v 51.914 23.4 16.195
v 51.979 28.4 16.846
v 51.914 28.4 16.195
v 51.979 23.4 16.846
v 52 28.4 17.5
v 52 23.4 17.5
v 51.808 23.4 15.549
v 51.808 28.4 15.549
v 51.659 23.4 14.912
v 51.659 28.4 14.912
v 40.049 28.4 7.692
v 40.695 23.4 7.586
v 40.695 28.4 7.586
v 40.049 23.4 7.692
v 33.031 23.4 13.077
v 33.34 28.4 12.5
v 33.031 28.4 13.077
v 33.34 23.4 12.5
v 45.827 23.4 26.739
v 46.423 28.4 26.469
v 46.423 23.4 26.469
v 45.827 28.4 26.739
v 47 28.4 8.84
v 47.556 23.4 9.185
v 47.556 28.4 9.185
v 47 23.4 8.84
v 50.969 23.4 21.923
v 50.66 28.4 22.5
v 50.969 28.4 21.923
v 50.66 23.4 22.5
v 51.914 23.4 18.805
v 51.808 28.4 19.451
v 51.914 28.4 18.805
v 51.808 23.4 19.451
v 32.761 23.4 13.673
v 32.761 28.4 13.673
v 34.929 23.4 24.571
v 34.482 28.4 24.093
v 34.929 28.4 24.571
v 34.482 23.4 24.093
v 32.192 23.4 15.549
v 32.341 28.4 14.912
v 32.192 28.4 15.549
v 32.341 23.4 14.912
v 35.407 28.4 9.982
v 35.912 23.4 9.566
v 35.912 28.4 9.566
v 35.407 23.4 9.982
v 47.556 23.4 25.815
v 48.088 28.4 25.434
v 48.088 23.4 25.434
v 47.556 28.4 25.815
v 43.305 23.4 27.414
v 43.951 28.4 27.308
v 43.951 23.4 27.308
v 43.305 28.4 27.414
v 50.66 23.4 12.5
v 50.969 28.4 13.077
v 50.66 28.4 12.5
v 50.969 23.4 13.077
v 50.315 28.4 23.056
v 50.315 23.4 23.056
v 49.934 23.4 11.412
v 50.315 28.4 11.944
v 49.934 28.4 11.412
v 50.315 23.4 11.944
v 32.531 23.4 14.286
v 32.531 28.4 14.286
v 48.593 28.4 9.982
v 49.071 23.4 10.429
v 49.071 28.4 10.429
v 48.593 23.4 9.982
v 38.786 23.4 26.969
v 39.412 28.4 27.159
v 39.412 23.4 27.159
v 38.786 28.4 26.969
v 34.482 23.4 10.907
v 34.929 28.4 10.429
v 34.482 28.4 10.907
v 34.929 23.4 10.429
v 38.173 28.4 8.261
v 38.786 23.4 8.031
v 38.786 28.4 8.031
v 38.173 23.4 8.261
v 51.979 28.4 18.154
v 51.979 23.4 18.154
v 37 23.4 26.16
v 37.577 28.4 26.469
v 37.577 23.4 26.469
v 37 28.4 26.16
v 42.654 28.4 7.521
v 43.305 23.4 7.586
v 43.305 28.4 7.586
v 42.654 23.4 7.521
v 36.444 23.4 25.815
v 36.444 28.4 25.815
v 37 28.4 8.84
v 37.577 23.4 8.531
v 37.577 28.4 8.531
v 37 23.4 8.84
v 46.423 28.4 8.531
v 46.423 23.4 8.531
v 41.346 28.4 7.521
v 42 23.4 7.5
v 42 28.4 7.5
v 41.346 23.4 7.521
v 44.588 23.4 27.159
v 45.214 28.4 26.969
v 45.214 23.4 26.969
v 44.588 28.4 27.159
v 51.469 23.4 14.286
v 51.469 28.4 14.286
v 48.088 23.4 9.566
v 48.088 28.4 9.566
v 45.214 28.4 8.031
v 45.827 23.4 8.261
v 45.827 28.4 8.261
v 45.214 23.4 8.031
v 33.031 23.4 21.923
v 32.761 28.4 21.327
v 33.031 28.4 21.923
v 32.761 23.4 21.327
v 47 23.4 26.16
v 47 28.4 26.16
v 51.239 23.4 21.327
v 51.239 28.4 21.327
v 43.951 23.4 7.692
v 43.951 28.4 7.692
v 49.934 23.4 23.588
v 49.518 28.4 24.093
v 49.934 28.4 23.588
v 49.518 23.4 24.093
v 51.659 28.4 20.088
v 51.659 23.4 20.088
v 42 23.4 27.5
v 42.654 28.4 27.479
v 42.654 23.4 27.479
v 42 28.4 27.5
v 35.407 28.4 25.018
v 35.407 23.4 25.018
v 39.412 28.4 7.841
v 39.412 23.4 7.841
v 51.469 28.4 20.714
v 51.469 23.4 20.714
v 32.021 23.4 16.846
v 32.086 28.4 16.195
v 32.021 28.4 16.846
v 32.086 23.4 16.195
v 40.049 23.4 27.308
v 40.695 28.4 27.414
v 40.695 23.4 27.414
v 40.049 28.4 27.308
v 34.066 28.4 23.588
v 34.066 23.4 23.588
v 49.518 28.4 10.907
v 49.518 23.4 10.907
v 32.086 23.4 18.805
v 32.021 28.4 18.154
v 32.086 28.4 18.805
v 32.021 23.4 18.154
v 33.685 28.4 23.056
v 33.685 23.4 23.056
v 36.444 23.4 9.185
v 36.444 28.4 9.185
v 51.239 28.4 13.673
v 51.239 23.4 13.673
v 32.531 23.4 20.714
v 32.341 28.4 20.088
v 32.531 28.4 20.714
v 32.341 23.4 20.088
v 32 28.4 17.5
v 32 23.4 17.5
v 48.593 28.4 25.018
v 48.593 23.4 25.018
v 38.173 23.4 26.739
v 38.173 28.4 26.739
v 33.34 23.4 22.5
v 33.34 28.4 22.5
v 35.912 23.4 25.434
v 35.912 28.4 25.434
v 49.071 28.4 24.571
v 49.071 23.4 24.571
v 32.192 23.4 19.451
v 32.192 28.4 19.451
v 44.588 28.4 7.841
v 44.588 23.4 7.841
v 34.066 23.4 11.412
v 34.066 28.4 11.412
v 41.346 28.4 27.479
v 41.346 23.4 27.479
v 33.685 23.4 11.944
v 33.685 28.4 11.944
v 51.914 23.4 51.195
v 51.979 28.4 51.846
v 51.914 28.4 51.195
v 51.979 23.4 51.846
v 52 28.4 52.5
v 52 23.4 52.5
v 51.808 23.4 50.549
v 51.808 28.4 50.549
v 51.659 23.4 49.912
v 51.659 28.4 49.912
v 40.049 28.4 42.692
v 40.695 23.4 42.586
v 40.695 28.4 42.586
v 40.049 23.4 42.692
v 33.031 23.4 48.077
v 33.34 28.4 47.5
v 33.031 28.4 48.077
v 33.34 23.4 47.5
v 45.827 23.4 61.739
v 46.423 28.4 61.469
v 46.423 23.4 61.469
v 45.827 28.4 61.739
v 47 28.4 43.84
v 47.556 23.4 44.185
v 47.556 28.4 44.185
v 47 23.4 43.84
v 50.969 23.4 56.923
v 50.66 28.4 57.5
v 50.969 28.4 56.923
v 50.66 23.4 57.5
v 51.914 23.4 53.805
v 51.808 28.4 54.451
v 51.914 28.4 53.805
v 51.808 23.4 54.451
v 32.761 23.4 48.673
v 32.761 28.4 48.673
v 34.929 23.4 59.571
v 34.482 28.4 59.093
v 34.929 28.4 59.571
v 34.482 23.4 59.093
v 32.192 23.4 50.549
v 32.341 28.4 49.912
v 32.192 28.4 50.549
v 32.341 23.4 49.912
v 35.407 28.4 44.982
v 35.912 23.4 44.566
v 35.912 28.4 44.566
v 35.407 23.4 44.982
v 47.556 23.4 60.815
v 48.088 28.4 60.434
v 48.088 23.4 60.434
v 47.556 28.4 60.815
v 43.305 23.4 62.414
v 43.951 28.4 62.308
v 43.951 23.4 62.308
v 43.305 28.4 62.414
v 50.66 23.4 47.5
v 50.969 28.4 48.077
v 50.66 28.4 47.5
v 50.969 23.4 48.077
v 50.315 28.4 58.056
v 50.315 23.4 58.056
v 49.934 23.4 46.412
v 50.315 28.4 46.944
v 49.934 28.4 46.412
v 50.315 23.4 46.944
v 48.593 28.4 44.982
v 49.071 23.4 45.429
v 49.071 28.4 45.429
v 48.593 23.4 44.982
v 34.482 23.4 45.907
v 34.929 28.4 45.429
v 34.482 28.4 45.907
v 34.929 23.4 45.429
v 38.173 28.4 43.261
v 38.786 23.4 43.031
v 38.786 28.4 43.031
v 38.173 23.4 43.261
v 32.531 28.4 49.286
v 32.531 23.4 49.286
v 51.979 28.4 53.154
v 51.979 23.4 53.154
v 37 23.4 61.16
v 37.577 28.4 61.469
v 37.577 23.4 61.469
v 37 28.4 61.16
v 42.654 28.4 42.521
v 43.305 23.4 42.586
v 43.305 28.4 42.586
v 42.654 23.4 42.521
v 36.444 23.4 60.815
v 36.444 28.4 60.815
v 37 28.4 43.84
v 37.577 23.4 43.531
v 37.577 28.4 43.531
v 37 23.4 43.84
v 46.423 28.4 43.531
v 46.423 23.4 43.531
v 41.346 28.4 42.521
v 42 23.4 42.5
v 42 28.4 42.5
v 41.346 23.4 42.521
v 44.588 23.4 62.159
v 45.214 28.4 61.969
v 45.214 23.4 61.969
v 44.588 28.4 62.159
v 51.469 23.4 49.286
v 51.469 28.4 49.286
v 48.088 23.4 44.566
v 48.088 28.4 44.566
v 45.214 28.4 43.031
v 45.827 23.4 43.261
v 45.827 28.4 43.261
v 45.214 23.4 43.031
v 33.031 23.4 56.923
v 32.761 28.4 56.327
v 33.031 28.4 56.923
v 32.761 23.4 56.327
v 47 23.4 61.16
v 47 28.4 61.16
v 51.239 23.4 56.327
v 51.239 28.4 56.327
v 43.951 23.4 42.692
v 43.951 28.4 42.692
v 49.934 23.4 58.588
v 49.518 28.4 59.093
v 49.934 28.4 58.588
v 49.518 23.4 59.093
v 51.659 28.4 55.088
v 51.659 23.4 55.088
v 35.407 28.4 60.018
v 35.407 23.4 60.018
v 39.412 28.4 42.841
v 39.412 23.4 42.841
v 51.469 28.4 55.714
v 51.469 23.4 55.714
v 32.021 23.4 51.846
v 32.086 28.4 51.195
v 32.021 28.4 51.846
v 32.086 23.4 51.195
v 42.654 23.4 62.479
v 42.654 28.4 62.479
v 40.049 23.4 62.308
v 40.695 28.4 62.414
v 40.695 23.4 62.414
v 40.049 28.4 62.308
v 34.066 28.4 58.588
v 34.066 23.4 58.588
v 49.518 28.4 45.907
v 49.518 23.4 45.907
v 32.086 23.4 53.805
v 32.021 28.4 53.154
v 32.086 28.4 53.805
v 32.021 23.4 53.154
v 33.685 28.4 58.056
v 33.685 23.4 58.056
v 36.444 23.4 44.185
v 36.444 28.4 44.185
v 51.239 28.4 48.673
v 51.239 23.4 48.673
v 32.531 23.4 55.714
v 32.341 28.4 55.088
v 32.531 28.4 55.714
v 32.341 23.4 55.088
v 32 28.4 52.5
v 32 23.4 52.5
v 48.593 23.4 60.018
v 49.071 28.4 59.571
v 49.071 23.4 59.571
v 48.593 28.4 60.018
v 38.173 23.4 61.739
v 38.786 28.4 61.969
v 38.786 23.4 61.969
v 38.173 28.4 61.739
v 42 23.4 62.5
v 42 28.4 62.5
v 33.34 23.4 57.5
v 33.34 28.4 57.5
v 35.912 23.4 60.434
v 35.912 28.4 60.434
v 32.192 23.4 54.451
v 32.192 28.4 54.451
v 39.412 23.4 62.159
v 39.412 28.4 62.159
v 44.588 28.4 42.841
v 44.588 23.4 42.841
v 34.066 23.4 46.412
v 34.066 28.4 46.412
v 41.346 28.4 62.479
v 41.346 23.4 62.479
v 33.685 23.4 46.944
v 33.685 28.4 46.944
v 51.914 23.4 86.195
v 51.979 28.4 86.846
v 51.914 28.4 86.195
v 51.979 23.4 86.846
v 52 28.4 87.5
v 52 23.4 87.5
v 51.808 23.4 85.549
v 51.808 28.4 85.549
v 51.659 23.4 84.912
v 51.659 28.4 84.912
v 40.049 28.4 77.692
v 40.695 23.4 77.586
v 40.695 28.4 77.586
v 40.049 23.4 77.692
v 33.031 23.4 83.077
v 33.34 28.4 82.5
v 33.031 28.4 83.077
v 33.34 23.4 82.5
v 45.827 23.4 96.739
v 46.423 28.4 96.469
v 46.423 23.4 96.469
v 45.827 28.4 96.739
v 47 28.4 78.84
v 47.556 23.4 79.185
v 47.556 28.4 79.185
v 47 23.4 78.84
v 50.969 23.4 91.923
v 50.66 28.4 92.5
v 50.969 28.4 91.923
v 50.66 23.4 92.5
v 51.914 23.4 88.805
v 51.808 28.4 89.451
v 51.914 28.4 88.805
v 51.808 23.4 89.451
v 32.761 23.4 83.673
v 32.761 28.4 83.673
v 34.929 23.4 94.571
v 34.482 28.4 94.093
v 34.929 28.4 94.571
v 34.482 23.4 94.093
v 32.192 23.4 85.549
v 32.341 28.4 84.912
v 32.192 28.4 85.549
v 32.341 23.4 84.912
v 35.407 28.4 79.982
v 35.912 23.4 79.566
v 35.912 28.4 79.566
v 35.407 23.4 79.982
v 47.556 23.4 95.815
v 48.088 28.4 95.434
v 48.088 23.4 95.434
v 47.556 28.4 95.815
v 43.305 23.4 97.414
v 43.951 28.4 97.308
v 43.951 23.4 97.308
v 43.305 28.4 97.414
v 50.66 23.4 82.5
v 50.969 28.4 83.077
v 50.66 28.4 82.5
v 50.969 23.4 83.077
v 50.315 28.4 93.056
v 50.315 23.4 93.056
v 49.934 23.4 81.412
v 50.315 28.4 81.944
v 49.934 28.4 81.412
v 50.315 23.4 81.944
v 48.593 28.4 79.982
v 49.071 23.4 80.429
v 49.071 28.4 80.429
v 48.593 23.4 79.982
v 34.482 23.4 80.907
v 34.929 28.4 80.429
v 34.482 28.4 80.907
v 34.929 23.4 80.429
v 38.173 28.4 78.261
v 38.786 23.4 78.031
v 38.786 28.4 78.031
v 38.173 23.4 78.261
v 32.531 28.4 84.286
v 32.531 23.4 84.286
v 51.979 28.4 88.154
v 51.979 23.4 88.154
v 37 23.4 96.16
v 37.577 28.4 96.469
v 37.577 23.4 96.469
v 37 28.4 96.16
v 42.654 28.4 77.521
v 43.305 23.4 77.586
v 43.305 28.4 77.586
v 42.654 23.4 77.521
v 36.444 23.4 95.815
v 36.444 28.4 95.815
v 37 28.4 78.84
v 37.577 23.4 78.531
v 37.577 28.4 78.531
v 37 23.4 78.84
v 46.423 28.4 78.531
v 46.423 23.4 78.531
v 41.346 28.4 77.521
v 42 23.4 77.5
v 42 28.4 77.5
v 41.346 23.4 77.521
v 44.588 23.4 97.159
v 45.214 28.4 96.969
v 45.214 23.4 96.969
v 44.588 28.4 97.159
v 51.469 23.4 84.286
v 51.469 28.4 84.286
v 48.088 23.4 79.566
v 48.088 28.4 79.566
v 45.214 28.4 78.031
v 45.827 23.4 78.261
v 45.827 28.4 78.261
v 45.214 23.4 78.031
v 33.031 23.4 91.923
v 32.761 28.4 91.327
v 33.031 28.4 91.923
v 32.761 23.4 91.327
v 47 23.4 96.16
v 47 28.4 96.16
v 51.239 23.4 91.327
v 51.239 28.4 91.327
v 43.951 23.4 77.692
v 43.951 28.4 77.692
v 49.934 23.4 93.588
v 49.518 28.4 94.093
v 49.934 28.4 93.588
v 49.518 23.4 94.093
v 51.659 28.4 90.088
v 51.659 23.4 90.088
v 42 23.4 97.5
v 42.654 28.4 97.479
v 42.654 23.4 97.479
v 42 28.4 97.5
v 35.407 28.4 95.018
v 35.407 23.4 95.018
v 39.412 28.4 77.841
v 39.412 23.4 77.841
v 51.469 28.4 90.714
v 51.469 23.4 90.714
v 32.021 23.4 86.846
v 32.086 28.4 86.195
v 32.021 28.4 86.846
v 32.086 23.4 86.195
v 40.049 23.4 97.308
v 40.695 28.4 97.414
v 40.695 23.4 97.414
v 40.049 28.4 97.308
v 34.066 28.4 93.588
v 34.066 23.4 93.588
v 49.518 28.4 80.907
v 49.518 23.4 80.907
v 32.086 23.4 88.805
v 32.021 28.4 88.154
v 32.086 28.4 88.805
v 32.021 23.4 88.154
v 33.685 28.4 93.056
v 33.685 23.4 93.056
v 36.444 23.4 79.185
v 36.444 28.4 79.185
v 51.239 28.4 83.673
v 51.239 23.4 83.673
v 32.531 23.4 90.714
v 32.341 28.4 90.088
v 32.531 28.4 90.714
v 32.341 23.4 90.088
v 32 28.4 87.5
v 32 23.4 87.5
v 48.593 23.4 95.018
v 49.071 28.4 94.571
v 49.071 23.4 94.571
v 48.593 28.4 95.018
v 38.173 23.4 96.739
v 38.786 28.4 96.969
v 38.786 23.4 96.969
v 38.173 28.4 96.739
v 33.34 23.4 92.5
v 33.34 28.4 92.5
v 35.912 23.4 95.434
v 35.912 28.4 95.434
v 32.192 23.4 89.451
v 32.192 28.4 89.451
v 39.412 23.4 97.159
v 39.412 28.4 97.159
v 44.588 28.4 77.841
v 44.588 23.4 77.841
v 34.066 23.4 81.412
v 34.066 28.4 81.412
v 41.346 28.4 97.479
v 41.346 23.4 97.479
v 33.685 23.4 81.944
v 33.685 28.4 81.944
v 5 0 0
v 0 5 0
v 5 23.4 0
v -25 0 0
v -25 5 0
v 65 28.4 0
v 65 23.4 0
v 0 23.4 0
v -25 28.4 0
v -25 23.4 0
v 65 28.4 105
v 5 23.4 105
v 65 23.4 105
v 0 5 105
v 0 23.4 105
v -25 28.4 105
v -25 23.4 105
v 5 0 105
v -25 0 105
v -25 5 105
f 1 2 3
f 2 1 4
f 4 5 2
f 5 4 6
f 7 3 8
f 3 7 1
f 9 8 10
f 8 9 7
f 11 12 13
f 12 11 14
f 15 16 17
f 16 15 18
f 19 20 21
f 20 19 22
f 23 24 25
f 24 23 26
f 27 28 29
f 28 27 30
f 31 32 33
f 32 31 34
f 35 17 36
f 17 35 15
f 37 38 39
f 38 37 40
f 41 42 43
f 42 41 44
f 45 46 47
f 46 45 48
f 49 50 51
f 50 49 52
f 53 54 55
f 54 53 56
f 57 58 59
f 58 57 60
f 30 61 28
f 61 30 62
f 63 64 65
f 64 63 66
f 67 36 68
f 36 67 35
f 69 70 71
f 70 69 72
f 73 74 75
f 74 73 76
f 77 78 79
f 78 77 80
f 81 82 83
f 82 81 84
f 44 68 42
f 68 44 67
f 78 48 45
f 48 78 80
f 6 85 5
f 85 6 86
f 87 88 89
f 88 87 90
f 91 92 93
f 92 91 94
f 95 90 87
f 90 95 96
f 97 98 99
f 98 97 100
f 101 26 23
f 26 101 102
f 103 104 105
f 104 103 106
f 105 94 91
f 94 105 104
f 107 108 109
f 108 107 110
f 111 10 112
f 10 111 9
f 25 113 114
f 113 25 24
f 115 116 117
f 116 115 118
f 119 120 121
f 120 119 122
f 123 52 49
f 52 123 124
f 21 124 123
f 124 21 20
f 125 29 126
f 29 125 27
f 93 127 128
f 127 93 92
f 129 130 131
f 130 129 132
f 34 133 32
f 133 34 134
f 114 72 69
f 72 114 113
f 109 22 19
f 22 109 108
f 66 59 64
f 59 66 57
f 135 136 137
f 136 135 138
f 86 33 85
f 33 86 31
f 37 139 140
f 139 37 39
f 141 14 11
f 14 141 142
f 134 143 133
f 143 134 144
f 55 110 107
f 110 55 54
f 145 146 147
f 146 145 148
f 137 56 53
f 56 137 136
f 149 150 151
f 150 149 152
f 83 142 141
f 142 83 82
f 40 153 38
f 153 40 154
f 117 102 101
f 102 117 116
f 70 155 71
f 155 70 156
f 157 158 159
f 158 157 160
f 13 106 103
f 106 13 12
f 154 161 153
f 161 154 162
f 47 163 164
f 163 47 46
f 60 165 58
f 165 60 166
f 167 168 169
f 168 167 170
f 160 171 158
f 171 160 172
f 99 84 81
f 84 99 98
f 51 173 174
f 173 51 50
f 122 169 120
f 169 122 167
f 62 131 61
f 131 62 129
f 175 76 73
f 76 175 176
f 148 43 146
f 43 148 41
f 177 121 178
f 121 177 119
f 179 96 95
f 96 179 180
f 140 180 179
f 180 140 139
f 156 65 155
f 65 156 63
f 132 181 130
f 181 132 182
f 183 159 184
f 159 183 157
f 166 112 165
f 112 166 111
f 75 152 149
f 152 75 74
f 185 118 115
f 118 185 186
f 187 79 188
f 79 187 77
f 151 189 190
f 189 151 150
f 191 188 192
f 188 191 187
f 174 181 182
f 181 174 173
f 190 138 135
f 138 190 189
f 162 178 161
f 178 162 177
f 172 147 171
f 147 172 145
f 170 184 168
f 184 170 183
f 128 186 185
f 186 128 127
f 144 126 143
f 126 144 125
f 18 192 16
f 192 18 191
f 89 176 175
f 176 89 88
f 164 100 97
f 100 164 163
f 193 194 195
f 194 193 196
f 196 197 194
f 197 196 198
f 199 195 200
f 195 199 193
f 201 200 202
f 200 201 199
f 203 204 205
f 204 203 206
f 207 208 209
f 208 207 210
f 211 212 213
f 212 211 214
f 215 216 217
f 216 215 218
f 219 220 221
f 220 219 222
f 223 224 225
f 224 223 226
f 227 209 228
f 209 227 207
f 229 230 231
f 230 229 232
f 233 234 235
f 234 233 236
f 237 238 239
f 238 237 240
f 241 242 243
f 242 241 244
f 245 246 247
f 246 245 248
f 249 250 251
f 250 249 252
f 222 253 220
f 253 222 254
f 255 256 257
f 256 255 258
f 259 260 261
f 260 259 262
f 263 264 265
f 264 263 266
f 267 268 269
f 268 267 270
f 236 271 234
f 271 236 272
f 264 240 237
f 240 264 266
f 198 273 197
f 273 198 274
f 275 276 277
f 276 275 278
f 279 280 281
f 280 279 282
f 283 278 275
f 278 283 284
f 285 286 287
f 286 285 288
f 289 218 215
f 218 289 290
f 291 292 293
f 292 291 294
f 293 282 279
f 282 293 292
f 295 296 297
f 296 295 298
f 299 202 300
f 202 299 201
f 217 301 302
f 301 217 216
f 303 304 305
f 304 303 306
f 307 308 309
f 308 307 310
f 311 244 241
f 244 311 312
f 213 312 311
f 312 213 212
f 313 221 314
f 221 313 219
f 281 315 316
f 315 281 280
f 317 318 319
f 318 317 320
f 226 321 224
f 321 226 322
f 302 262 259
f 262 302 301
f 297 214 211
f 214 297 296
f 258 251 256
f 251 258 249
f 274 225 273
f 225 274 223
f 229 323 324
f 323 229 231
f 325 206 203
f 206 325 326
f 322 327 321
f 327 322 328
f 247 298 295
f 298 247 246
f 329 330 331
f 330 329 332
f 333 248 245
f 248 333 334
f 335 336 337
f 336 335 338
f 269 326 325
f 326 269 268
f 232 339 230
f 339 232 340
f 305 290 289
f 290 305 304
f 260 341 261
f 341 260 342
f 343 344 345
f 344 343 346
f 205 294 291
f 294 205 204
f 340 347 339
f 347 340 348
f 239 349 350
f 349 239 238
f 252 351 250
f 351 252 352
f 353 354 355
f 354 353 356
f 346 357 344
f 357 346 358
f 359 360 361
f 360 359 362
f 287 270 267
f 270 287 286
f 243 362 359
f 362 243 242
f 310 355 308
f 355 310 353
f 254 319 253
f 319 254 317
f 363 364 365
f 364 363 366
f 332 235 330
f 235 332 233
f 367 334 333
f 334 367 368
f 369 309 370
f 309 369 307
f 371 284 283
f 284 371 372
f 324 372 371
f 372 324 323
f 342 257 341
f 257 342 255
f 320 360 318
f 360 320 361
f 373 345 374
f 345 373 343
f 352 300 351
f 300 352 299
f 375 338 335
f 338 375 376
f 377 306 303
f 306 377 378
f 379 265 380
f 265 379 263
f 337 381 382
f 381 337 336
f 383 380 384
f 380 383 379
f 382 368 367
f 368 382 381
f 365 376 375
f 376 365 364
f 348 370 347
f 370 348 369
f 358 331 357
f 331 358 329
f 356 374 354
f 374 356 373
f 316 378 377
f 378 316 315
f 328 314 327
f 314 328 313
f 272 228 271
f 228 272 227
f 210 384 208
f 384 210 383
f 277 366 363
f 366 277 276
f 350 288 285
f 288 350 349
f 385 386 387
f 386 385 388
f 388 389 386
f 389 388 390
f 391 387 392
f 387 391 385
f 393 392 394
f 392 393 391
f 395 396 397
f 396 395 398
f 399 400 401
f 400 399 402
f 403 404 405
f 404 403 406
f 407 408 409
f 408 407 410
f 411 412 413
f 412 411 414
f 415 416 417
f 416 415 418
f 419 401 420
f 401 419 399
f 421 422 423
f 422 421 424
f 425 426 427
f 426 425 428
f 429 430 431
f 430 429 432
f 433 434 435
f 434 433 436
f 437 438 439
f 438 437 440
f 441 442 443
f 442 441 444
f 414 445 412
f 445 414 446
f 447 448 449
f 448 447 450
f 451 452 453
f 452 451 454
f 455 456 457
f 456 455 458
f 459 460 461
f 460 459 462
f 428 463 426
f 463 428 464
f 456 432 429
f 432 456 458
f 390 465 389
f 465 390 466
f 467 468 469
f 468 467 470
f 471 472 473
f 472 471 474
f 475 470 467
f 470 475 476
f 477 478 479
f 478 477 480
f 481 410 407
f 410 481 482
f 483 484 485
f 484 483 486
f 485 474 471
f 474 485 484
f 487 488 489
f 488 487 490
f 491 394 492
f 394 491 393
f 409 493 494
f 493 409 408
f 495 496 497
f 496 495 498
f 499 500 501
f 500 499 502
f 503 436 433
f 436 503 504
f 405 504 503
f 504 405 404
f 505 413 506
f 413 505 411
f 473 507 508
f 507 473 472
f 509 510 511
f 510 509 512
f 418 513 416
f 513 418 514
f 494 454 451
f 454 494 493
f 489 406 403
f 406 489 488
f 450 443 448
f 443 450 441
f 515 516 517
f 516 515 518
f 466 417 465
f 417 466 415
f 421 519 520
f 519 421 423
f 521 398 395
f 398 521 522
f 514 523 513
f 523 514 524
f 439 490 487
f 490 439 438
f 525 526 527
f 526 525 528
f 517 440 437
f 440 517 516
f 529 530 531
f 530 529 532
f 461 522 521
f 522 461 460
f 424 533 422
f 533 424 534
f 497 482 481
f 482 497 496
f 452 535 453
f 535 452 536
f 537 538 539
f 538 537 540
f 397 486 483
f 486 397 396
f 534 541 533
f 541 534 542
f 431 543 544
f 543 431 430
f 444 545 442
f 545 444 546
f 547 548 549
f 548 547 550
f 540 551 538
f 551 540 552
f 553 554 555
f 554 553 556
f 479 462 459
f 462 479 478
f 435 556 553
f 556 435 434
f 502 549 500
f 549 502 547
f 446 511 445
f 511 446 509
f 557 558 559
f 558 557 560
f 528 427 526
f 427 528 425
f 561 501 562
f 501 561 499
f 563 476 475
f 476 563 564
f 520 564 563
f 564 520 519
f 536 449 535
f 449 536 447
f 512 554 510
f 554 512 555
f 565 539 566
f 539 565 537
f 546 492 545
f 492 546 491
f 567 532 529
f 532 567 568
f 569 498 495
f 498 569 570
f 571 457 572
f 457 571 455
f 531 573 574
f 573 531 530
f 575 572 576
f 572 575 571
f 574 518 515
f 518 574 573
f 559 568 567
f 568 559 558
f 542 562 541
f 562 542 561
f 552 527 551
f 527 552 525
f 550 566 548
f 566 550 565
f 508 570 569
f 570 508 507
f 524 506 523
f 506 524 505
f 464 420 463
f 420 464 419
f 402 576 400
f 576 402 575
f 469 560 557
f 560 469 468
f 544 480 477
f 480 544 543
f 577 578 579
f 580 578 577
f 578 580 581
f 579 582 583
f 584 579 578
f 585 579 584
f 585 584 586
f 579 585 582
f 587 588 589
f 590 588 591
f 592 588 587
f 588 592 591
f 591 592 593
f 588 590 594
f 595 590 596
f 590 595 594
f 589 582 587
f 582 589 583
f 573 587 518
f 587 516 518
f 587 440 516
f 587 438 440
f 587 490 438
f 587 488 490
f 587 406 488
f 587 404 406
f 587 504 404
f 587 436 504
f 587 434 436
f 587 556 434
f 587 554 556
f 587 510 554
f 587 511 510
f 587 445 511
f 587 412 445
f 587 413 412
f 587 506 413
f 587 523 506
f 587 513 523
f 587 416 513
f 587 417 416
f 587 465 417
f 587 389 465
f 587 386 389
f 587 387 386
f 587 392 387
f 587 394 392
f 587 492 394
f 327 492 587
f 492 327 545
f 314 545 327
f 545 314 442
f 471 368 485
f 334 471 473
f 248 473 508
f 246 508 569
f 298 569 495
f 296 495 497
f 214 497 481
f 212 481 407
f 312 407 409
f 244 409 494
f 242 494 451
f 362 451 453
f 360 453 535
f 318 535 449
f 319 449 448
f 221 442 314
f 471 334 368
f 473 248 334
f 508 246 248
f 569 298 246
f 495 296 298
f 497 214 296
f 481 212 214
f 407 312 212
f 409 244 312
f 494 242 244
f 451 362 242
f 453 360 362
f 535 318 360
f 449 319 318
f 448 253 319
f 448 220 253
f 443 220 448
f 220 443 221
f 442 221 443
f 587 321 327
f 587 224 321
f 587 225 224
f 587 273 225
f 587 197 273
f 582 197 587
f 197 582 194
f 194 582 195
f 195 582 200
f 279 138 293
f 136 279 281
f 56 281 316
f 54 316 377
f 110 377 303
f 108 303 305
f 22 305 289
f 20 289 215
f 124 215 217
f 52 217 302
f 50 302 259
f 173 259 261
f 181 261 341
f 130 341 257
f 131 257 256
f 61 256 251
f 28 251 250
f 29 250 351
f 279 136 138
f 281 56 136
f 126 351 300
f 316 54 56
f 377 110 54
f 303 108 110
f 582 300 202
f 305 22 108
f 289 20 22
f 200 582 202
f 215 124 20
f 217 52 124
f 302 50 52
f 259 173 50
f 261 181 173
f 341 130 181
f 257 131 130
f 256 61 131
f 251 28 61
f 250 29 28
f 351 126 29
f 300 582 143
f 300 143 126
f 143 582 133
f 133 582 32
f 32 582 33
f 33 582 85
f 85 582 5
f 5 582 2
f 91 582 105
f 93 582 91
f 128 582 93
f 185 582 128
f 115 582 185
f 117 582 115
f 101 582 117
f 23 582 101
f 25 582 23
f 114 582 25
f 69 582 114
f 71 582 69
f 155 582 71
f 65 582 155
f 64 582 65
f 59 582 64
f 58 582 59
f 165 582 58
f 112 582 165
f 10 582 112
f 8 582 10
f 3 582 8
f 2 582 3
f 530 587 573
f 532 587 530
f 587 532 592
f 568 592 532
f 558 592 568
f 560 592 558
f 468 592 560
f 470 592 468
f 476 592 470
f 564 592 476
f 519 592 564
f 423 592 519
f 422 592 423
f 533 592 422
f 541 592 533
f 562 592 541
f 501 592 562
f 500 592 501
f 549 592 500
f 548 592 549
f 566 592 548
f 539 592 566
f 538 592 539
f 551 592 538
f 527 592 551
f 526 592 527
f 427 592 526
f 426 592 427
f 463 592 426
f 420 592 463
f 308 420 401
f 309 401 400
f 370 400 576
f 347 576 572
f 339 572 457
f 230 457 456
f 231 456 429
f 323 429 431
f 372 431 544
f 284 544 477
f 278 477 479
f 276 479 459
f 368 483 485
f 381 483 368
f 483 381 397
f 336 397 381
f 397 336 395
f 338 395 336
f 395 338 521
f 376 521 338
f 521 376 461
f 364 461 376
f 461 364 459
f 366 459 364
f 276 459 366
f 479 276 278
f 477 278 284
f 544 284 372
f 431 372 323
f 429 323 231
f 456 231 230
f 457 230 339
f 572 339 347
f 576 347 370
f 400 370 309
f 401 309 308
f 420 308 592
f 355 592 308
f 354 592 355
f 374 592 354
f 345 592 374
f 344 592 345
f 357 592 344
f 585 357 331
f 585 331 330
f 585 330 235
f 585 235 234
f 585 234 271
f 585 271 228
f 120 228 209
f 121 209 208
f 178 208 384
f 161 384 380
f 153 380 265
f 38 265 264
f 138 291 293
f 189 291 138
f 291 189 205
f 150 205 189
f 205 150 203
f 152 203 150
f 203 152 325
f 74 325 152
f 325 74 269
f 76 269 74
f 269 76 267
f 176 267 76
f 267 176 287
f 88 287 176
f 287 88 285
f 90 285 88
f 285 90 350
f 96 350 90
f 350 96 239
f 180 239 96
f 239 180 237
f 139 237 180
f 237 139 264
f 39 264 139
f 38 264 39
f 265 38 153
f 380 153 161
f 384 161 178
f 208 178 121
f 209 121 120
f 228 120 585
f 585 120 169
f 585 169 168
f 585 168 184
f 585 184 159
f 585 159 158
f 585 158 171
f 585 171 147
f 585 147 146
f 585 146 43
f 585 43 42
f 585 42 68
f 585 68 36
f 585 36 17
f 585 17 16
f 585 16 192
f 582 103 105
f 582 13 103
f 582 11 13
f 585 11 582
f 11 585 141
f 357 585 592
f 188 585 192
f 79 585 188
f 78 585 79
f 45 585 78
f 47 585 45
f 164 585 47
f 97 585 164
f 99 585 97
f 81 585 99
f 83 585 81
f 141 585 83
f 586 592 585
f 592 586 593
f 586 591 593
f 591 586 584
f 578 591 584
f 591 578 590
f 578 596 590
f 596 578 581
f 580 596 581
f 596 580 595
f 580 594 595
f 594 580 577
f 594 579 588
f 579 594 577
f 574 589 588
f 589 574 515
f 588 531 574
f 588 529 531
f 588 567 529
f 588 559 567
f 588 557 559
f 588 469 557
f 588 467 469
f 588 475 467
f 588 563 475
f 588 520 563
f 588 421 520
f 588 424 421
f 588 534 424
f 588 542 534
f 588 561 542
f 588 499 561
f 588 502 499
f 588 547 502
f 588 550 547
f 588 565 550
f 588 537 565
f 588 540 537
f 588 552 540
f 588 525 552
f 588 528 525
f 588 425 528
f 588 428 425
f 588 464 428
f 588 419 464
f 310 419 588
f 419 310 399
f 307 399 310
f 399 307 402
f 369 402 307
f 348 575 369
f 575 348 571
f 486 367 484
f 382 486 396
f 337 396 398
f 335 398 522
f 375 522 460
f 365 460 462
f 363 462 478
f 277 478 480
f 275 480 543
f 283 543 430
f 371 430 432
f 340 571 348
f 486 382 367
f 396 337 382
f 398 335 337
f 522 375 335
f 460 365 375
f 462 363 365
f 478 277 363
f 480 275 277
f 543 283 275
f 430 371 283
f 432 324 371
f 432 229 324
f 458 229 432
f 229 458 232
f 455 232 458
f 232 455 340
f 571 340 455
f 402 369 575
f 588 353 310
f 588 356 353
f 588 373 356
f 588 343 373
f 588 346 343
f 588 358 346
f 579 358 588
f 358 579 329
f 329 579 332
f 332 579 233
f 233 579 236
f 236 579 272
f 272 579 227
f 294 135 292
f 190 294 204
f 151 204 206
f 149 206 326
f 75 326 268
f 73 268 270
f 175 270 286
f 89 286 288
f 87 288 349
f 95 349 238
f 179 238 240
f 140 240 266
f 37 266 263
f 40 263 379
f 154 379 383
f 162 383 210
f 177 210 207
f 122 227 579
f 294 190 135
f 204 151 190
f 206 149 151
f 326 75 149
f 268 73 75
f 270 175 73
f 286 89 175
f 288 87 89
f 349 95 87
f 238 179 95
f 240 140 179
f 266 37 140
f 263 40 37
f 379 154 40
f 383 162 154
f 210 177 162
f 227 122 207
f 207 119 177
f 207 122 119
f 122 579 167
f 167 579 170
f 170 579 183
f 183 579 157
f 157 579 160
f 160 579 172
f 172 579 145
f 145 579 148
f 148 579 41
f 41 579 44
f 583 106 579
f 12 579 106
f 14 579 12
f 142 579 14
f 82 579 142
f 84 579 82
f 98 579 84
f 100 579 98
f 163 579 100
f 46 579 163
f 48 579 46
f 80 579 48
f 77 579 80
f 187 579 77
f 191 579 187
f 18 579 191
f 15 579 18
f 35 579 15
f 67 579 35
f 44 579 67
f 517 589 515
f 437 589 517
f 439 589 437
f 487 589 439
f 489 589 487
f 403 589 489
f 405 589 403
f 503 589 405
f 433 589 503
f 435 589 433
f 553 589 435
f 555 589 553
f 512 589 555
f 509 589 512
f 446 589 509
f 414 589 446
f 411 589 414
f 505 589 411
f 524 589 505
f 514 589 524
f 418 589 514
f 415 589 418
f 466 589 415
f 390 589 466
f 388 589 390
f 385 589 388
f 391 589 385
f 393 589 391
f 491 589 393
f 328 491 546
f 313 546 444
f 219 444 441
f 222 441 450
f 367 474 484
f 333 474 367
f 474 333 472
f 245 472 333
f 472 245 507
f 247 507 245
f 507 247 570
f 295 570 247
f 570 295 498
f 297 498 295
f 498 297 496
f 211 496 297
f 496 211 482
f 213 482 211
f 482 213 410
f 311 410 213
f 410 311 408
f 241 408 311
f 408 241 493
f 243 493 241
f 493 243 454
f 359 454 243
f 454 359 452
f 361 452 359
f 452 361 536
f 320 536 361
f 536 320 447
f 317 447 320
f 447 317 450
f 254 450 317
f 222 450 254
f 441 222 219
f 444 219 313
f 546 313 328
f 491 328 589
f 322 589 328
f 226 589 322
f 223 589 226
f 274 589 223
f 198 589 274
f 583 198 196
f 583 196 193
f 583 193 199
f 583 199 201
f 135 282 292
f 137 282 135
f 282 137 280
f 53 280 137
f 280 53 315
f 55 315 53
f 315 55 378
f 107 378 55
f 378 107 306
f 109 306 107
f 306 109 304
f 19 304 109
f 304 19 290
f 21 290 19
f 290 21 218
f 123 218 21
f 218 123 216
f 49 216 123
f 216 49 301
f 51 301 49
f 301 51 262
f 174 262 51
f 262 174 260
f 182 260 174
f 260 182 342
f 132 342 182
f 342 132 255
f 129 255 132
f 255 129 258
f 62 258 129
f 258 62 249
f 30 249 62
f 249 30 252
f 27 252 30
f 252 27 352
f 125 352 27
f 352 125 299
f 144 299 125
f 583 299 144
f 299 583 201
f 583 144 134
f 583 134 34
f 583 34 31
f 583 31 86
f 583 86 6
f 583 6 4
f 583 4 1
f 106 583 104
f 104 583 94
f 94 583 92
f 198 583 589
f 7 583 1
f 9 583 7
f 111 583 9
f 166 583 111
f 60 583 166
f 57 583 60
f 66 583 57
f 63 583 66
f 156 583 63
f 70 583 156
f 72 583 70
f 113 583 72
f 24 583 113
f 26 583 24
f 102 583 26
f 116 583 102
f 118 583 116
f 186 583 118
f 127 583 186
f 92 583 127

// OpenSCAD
// Holder for 3 single-channel pipettes that clamps onto the front edge of an 18 mm shelf
// Category: quick fixes. A C-shaped clamp (spine, bottom jaw, top jaw) whose top jaw continues
// forward as an arm with three 20 mm holes; each pipette drops in and hangs by its handle.
// Modelled in print orientation: lying on its side, the profile in XY extruded along Z
// (in use +Y is up and +X points away from the shelf), so the jaws print as plain walls.
// Print: PETG (springier than PLA), 0.2 mm layers, 4 perimeters.
// SPDX-License-Identifier: CERN-OHL-P-2.0

/* [Holder] */
width = 105;              // extrusion length (along the shelf edge)
spine = [0, 5];           // x from, x to
jaw_back = -25;           // both jaws reach back to x = -25
jaw_t = 5;
gap = 18.4;               // 18 mm shelf + clearance
arm_front = 65;           // the top jaw continues forward to x = 65
hole_d = 20;
hole_x = 42;
hole_z = [17.5, 52.5, 87.5];

/* [Hidden] */
eps = 0.01;
H = jaw_t + gap + jaw_t;  // 28.4

difference() {
    linear_extrude(width) union() {
        translate([spine[0], 0]) square([spine[1] - spine[0], H]);
        translate([jaw_back, 0]) square([spine[1] - jaw_back, jaw_t]);
        translate([jaw_back, H - jaw_t]) square([arm_front - jaw_back, jaw_t]);
    }
    for (z = hole_z)
        translate([hole_x, H - jaw_t - 1, z]) rotate([-90, 0, 0]) cylinder(d = hole_d, h = jaw_t + 2, $fn = 96);
}
